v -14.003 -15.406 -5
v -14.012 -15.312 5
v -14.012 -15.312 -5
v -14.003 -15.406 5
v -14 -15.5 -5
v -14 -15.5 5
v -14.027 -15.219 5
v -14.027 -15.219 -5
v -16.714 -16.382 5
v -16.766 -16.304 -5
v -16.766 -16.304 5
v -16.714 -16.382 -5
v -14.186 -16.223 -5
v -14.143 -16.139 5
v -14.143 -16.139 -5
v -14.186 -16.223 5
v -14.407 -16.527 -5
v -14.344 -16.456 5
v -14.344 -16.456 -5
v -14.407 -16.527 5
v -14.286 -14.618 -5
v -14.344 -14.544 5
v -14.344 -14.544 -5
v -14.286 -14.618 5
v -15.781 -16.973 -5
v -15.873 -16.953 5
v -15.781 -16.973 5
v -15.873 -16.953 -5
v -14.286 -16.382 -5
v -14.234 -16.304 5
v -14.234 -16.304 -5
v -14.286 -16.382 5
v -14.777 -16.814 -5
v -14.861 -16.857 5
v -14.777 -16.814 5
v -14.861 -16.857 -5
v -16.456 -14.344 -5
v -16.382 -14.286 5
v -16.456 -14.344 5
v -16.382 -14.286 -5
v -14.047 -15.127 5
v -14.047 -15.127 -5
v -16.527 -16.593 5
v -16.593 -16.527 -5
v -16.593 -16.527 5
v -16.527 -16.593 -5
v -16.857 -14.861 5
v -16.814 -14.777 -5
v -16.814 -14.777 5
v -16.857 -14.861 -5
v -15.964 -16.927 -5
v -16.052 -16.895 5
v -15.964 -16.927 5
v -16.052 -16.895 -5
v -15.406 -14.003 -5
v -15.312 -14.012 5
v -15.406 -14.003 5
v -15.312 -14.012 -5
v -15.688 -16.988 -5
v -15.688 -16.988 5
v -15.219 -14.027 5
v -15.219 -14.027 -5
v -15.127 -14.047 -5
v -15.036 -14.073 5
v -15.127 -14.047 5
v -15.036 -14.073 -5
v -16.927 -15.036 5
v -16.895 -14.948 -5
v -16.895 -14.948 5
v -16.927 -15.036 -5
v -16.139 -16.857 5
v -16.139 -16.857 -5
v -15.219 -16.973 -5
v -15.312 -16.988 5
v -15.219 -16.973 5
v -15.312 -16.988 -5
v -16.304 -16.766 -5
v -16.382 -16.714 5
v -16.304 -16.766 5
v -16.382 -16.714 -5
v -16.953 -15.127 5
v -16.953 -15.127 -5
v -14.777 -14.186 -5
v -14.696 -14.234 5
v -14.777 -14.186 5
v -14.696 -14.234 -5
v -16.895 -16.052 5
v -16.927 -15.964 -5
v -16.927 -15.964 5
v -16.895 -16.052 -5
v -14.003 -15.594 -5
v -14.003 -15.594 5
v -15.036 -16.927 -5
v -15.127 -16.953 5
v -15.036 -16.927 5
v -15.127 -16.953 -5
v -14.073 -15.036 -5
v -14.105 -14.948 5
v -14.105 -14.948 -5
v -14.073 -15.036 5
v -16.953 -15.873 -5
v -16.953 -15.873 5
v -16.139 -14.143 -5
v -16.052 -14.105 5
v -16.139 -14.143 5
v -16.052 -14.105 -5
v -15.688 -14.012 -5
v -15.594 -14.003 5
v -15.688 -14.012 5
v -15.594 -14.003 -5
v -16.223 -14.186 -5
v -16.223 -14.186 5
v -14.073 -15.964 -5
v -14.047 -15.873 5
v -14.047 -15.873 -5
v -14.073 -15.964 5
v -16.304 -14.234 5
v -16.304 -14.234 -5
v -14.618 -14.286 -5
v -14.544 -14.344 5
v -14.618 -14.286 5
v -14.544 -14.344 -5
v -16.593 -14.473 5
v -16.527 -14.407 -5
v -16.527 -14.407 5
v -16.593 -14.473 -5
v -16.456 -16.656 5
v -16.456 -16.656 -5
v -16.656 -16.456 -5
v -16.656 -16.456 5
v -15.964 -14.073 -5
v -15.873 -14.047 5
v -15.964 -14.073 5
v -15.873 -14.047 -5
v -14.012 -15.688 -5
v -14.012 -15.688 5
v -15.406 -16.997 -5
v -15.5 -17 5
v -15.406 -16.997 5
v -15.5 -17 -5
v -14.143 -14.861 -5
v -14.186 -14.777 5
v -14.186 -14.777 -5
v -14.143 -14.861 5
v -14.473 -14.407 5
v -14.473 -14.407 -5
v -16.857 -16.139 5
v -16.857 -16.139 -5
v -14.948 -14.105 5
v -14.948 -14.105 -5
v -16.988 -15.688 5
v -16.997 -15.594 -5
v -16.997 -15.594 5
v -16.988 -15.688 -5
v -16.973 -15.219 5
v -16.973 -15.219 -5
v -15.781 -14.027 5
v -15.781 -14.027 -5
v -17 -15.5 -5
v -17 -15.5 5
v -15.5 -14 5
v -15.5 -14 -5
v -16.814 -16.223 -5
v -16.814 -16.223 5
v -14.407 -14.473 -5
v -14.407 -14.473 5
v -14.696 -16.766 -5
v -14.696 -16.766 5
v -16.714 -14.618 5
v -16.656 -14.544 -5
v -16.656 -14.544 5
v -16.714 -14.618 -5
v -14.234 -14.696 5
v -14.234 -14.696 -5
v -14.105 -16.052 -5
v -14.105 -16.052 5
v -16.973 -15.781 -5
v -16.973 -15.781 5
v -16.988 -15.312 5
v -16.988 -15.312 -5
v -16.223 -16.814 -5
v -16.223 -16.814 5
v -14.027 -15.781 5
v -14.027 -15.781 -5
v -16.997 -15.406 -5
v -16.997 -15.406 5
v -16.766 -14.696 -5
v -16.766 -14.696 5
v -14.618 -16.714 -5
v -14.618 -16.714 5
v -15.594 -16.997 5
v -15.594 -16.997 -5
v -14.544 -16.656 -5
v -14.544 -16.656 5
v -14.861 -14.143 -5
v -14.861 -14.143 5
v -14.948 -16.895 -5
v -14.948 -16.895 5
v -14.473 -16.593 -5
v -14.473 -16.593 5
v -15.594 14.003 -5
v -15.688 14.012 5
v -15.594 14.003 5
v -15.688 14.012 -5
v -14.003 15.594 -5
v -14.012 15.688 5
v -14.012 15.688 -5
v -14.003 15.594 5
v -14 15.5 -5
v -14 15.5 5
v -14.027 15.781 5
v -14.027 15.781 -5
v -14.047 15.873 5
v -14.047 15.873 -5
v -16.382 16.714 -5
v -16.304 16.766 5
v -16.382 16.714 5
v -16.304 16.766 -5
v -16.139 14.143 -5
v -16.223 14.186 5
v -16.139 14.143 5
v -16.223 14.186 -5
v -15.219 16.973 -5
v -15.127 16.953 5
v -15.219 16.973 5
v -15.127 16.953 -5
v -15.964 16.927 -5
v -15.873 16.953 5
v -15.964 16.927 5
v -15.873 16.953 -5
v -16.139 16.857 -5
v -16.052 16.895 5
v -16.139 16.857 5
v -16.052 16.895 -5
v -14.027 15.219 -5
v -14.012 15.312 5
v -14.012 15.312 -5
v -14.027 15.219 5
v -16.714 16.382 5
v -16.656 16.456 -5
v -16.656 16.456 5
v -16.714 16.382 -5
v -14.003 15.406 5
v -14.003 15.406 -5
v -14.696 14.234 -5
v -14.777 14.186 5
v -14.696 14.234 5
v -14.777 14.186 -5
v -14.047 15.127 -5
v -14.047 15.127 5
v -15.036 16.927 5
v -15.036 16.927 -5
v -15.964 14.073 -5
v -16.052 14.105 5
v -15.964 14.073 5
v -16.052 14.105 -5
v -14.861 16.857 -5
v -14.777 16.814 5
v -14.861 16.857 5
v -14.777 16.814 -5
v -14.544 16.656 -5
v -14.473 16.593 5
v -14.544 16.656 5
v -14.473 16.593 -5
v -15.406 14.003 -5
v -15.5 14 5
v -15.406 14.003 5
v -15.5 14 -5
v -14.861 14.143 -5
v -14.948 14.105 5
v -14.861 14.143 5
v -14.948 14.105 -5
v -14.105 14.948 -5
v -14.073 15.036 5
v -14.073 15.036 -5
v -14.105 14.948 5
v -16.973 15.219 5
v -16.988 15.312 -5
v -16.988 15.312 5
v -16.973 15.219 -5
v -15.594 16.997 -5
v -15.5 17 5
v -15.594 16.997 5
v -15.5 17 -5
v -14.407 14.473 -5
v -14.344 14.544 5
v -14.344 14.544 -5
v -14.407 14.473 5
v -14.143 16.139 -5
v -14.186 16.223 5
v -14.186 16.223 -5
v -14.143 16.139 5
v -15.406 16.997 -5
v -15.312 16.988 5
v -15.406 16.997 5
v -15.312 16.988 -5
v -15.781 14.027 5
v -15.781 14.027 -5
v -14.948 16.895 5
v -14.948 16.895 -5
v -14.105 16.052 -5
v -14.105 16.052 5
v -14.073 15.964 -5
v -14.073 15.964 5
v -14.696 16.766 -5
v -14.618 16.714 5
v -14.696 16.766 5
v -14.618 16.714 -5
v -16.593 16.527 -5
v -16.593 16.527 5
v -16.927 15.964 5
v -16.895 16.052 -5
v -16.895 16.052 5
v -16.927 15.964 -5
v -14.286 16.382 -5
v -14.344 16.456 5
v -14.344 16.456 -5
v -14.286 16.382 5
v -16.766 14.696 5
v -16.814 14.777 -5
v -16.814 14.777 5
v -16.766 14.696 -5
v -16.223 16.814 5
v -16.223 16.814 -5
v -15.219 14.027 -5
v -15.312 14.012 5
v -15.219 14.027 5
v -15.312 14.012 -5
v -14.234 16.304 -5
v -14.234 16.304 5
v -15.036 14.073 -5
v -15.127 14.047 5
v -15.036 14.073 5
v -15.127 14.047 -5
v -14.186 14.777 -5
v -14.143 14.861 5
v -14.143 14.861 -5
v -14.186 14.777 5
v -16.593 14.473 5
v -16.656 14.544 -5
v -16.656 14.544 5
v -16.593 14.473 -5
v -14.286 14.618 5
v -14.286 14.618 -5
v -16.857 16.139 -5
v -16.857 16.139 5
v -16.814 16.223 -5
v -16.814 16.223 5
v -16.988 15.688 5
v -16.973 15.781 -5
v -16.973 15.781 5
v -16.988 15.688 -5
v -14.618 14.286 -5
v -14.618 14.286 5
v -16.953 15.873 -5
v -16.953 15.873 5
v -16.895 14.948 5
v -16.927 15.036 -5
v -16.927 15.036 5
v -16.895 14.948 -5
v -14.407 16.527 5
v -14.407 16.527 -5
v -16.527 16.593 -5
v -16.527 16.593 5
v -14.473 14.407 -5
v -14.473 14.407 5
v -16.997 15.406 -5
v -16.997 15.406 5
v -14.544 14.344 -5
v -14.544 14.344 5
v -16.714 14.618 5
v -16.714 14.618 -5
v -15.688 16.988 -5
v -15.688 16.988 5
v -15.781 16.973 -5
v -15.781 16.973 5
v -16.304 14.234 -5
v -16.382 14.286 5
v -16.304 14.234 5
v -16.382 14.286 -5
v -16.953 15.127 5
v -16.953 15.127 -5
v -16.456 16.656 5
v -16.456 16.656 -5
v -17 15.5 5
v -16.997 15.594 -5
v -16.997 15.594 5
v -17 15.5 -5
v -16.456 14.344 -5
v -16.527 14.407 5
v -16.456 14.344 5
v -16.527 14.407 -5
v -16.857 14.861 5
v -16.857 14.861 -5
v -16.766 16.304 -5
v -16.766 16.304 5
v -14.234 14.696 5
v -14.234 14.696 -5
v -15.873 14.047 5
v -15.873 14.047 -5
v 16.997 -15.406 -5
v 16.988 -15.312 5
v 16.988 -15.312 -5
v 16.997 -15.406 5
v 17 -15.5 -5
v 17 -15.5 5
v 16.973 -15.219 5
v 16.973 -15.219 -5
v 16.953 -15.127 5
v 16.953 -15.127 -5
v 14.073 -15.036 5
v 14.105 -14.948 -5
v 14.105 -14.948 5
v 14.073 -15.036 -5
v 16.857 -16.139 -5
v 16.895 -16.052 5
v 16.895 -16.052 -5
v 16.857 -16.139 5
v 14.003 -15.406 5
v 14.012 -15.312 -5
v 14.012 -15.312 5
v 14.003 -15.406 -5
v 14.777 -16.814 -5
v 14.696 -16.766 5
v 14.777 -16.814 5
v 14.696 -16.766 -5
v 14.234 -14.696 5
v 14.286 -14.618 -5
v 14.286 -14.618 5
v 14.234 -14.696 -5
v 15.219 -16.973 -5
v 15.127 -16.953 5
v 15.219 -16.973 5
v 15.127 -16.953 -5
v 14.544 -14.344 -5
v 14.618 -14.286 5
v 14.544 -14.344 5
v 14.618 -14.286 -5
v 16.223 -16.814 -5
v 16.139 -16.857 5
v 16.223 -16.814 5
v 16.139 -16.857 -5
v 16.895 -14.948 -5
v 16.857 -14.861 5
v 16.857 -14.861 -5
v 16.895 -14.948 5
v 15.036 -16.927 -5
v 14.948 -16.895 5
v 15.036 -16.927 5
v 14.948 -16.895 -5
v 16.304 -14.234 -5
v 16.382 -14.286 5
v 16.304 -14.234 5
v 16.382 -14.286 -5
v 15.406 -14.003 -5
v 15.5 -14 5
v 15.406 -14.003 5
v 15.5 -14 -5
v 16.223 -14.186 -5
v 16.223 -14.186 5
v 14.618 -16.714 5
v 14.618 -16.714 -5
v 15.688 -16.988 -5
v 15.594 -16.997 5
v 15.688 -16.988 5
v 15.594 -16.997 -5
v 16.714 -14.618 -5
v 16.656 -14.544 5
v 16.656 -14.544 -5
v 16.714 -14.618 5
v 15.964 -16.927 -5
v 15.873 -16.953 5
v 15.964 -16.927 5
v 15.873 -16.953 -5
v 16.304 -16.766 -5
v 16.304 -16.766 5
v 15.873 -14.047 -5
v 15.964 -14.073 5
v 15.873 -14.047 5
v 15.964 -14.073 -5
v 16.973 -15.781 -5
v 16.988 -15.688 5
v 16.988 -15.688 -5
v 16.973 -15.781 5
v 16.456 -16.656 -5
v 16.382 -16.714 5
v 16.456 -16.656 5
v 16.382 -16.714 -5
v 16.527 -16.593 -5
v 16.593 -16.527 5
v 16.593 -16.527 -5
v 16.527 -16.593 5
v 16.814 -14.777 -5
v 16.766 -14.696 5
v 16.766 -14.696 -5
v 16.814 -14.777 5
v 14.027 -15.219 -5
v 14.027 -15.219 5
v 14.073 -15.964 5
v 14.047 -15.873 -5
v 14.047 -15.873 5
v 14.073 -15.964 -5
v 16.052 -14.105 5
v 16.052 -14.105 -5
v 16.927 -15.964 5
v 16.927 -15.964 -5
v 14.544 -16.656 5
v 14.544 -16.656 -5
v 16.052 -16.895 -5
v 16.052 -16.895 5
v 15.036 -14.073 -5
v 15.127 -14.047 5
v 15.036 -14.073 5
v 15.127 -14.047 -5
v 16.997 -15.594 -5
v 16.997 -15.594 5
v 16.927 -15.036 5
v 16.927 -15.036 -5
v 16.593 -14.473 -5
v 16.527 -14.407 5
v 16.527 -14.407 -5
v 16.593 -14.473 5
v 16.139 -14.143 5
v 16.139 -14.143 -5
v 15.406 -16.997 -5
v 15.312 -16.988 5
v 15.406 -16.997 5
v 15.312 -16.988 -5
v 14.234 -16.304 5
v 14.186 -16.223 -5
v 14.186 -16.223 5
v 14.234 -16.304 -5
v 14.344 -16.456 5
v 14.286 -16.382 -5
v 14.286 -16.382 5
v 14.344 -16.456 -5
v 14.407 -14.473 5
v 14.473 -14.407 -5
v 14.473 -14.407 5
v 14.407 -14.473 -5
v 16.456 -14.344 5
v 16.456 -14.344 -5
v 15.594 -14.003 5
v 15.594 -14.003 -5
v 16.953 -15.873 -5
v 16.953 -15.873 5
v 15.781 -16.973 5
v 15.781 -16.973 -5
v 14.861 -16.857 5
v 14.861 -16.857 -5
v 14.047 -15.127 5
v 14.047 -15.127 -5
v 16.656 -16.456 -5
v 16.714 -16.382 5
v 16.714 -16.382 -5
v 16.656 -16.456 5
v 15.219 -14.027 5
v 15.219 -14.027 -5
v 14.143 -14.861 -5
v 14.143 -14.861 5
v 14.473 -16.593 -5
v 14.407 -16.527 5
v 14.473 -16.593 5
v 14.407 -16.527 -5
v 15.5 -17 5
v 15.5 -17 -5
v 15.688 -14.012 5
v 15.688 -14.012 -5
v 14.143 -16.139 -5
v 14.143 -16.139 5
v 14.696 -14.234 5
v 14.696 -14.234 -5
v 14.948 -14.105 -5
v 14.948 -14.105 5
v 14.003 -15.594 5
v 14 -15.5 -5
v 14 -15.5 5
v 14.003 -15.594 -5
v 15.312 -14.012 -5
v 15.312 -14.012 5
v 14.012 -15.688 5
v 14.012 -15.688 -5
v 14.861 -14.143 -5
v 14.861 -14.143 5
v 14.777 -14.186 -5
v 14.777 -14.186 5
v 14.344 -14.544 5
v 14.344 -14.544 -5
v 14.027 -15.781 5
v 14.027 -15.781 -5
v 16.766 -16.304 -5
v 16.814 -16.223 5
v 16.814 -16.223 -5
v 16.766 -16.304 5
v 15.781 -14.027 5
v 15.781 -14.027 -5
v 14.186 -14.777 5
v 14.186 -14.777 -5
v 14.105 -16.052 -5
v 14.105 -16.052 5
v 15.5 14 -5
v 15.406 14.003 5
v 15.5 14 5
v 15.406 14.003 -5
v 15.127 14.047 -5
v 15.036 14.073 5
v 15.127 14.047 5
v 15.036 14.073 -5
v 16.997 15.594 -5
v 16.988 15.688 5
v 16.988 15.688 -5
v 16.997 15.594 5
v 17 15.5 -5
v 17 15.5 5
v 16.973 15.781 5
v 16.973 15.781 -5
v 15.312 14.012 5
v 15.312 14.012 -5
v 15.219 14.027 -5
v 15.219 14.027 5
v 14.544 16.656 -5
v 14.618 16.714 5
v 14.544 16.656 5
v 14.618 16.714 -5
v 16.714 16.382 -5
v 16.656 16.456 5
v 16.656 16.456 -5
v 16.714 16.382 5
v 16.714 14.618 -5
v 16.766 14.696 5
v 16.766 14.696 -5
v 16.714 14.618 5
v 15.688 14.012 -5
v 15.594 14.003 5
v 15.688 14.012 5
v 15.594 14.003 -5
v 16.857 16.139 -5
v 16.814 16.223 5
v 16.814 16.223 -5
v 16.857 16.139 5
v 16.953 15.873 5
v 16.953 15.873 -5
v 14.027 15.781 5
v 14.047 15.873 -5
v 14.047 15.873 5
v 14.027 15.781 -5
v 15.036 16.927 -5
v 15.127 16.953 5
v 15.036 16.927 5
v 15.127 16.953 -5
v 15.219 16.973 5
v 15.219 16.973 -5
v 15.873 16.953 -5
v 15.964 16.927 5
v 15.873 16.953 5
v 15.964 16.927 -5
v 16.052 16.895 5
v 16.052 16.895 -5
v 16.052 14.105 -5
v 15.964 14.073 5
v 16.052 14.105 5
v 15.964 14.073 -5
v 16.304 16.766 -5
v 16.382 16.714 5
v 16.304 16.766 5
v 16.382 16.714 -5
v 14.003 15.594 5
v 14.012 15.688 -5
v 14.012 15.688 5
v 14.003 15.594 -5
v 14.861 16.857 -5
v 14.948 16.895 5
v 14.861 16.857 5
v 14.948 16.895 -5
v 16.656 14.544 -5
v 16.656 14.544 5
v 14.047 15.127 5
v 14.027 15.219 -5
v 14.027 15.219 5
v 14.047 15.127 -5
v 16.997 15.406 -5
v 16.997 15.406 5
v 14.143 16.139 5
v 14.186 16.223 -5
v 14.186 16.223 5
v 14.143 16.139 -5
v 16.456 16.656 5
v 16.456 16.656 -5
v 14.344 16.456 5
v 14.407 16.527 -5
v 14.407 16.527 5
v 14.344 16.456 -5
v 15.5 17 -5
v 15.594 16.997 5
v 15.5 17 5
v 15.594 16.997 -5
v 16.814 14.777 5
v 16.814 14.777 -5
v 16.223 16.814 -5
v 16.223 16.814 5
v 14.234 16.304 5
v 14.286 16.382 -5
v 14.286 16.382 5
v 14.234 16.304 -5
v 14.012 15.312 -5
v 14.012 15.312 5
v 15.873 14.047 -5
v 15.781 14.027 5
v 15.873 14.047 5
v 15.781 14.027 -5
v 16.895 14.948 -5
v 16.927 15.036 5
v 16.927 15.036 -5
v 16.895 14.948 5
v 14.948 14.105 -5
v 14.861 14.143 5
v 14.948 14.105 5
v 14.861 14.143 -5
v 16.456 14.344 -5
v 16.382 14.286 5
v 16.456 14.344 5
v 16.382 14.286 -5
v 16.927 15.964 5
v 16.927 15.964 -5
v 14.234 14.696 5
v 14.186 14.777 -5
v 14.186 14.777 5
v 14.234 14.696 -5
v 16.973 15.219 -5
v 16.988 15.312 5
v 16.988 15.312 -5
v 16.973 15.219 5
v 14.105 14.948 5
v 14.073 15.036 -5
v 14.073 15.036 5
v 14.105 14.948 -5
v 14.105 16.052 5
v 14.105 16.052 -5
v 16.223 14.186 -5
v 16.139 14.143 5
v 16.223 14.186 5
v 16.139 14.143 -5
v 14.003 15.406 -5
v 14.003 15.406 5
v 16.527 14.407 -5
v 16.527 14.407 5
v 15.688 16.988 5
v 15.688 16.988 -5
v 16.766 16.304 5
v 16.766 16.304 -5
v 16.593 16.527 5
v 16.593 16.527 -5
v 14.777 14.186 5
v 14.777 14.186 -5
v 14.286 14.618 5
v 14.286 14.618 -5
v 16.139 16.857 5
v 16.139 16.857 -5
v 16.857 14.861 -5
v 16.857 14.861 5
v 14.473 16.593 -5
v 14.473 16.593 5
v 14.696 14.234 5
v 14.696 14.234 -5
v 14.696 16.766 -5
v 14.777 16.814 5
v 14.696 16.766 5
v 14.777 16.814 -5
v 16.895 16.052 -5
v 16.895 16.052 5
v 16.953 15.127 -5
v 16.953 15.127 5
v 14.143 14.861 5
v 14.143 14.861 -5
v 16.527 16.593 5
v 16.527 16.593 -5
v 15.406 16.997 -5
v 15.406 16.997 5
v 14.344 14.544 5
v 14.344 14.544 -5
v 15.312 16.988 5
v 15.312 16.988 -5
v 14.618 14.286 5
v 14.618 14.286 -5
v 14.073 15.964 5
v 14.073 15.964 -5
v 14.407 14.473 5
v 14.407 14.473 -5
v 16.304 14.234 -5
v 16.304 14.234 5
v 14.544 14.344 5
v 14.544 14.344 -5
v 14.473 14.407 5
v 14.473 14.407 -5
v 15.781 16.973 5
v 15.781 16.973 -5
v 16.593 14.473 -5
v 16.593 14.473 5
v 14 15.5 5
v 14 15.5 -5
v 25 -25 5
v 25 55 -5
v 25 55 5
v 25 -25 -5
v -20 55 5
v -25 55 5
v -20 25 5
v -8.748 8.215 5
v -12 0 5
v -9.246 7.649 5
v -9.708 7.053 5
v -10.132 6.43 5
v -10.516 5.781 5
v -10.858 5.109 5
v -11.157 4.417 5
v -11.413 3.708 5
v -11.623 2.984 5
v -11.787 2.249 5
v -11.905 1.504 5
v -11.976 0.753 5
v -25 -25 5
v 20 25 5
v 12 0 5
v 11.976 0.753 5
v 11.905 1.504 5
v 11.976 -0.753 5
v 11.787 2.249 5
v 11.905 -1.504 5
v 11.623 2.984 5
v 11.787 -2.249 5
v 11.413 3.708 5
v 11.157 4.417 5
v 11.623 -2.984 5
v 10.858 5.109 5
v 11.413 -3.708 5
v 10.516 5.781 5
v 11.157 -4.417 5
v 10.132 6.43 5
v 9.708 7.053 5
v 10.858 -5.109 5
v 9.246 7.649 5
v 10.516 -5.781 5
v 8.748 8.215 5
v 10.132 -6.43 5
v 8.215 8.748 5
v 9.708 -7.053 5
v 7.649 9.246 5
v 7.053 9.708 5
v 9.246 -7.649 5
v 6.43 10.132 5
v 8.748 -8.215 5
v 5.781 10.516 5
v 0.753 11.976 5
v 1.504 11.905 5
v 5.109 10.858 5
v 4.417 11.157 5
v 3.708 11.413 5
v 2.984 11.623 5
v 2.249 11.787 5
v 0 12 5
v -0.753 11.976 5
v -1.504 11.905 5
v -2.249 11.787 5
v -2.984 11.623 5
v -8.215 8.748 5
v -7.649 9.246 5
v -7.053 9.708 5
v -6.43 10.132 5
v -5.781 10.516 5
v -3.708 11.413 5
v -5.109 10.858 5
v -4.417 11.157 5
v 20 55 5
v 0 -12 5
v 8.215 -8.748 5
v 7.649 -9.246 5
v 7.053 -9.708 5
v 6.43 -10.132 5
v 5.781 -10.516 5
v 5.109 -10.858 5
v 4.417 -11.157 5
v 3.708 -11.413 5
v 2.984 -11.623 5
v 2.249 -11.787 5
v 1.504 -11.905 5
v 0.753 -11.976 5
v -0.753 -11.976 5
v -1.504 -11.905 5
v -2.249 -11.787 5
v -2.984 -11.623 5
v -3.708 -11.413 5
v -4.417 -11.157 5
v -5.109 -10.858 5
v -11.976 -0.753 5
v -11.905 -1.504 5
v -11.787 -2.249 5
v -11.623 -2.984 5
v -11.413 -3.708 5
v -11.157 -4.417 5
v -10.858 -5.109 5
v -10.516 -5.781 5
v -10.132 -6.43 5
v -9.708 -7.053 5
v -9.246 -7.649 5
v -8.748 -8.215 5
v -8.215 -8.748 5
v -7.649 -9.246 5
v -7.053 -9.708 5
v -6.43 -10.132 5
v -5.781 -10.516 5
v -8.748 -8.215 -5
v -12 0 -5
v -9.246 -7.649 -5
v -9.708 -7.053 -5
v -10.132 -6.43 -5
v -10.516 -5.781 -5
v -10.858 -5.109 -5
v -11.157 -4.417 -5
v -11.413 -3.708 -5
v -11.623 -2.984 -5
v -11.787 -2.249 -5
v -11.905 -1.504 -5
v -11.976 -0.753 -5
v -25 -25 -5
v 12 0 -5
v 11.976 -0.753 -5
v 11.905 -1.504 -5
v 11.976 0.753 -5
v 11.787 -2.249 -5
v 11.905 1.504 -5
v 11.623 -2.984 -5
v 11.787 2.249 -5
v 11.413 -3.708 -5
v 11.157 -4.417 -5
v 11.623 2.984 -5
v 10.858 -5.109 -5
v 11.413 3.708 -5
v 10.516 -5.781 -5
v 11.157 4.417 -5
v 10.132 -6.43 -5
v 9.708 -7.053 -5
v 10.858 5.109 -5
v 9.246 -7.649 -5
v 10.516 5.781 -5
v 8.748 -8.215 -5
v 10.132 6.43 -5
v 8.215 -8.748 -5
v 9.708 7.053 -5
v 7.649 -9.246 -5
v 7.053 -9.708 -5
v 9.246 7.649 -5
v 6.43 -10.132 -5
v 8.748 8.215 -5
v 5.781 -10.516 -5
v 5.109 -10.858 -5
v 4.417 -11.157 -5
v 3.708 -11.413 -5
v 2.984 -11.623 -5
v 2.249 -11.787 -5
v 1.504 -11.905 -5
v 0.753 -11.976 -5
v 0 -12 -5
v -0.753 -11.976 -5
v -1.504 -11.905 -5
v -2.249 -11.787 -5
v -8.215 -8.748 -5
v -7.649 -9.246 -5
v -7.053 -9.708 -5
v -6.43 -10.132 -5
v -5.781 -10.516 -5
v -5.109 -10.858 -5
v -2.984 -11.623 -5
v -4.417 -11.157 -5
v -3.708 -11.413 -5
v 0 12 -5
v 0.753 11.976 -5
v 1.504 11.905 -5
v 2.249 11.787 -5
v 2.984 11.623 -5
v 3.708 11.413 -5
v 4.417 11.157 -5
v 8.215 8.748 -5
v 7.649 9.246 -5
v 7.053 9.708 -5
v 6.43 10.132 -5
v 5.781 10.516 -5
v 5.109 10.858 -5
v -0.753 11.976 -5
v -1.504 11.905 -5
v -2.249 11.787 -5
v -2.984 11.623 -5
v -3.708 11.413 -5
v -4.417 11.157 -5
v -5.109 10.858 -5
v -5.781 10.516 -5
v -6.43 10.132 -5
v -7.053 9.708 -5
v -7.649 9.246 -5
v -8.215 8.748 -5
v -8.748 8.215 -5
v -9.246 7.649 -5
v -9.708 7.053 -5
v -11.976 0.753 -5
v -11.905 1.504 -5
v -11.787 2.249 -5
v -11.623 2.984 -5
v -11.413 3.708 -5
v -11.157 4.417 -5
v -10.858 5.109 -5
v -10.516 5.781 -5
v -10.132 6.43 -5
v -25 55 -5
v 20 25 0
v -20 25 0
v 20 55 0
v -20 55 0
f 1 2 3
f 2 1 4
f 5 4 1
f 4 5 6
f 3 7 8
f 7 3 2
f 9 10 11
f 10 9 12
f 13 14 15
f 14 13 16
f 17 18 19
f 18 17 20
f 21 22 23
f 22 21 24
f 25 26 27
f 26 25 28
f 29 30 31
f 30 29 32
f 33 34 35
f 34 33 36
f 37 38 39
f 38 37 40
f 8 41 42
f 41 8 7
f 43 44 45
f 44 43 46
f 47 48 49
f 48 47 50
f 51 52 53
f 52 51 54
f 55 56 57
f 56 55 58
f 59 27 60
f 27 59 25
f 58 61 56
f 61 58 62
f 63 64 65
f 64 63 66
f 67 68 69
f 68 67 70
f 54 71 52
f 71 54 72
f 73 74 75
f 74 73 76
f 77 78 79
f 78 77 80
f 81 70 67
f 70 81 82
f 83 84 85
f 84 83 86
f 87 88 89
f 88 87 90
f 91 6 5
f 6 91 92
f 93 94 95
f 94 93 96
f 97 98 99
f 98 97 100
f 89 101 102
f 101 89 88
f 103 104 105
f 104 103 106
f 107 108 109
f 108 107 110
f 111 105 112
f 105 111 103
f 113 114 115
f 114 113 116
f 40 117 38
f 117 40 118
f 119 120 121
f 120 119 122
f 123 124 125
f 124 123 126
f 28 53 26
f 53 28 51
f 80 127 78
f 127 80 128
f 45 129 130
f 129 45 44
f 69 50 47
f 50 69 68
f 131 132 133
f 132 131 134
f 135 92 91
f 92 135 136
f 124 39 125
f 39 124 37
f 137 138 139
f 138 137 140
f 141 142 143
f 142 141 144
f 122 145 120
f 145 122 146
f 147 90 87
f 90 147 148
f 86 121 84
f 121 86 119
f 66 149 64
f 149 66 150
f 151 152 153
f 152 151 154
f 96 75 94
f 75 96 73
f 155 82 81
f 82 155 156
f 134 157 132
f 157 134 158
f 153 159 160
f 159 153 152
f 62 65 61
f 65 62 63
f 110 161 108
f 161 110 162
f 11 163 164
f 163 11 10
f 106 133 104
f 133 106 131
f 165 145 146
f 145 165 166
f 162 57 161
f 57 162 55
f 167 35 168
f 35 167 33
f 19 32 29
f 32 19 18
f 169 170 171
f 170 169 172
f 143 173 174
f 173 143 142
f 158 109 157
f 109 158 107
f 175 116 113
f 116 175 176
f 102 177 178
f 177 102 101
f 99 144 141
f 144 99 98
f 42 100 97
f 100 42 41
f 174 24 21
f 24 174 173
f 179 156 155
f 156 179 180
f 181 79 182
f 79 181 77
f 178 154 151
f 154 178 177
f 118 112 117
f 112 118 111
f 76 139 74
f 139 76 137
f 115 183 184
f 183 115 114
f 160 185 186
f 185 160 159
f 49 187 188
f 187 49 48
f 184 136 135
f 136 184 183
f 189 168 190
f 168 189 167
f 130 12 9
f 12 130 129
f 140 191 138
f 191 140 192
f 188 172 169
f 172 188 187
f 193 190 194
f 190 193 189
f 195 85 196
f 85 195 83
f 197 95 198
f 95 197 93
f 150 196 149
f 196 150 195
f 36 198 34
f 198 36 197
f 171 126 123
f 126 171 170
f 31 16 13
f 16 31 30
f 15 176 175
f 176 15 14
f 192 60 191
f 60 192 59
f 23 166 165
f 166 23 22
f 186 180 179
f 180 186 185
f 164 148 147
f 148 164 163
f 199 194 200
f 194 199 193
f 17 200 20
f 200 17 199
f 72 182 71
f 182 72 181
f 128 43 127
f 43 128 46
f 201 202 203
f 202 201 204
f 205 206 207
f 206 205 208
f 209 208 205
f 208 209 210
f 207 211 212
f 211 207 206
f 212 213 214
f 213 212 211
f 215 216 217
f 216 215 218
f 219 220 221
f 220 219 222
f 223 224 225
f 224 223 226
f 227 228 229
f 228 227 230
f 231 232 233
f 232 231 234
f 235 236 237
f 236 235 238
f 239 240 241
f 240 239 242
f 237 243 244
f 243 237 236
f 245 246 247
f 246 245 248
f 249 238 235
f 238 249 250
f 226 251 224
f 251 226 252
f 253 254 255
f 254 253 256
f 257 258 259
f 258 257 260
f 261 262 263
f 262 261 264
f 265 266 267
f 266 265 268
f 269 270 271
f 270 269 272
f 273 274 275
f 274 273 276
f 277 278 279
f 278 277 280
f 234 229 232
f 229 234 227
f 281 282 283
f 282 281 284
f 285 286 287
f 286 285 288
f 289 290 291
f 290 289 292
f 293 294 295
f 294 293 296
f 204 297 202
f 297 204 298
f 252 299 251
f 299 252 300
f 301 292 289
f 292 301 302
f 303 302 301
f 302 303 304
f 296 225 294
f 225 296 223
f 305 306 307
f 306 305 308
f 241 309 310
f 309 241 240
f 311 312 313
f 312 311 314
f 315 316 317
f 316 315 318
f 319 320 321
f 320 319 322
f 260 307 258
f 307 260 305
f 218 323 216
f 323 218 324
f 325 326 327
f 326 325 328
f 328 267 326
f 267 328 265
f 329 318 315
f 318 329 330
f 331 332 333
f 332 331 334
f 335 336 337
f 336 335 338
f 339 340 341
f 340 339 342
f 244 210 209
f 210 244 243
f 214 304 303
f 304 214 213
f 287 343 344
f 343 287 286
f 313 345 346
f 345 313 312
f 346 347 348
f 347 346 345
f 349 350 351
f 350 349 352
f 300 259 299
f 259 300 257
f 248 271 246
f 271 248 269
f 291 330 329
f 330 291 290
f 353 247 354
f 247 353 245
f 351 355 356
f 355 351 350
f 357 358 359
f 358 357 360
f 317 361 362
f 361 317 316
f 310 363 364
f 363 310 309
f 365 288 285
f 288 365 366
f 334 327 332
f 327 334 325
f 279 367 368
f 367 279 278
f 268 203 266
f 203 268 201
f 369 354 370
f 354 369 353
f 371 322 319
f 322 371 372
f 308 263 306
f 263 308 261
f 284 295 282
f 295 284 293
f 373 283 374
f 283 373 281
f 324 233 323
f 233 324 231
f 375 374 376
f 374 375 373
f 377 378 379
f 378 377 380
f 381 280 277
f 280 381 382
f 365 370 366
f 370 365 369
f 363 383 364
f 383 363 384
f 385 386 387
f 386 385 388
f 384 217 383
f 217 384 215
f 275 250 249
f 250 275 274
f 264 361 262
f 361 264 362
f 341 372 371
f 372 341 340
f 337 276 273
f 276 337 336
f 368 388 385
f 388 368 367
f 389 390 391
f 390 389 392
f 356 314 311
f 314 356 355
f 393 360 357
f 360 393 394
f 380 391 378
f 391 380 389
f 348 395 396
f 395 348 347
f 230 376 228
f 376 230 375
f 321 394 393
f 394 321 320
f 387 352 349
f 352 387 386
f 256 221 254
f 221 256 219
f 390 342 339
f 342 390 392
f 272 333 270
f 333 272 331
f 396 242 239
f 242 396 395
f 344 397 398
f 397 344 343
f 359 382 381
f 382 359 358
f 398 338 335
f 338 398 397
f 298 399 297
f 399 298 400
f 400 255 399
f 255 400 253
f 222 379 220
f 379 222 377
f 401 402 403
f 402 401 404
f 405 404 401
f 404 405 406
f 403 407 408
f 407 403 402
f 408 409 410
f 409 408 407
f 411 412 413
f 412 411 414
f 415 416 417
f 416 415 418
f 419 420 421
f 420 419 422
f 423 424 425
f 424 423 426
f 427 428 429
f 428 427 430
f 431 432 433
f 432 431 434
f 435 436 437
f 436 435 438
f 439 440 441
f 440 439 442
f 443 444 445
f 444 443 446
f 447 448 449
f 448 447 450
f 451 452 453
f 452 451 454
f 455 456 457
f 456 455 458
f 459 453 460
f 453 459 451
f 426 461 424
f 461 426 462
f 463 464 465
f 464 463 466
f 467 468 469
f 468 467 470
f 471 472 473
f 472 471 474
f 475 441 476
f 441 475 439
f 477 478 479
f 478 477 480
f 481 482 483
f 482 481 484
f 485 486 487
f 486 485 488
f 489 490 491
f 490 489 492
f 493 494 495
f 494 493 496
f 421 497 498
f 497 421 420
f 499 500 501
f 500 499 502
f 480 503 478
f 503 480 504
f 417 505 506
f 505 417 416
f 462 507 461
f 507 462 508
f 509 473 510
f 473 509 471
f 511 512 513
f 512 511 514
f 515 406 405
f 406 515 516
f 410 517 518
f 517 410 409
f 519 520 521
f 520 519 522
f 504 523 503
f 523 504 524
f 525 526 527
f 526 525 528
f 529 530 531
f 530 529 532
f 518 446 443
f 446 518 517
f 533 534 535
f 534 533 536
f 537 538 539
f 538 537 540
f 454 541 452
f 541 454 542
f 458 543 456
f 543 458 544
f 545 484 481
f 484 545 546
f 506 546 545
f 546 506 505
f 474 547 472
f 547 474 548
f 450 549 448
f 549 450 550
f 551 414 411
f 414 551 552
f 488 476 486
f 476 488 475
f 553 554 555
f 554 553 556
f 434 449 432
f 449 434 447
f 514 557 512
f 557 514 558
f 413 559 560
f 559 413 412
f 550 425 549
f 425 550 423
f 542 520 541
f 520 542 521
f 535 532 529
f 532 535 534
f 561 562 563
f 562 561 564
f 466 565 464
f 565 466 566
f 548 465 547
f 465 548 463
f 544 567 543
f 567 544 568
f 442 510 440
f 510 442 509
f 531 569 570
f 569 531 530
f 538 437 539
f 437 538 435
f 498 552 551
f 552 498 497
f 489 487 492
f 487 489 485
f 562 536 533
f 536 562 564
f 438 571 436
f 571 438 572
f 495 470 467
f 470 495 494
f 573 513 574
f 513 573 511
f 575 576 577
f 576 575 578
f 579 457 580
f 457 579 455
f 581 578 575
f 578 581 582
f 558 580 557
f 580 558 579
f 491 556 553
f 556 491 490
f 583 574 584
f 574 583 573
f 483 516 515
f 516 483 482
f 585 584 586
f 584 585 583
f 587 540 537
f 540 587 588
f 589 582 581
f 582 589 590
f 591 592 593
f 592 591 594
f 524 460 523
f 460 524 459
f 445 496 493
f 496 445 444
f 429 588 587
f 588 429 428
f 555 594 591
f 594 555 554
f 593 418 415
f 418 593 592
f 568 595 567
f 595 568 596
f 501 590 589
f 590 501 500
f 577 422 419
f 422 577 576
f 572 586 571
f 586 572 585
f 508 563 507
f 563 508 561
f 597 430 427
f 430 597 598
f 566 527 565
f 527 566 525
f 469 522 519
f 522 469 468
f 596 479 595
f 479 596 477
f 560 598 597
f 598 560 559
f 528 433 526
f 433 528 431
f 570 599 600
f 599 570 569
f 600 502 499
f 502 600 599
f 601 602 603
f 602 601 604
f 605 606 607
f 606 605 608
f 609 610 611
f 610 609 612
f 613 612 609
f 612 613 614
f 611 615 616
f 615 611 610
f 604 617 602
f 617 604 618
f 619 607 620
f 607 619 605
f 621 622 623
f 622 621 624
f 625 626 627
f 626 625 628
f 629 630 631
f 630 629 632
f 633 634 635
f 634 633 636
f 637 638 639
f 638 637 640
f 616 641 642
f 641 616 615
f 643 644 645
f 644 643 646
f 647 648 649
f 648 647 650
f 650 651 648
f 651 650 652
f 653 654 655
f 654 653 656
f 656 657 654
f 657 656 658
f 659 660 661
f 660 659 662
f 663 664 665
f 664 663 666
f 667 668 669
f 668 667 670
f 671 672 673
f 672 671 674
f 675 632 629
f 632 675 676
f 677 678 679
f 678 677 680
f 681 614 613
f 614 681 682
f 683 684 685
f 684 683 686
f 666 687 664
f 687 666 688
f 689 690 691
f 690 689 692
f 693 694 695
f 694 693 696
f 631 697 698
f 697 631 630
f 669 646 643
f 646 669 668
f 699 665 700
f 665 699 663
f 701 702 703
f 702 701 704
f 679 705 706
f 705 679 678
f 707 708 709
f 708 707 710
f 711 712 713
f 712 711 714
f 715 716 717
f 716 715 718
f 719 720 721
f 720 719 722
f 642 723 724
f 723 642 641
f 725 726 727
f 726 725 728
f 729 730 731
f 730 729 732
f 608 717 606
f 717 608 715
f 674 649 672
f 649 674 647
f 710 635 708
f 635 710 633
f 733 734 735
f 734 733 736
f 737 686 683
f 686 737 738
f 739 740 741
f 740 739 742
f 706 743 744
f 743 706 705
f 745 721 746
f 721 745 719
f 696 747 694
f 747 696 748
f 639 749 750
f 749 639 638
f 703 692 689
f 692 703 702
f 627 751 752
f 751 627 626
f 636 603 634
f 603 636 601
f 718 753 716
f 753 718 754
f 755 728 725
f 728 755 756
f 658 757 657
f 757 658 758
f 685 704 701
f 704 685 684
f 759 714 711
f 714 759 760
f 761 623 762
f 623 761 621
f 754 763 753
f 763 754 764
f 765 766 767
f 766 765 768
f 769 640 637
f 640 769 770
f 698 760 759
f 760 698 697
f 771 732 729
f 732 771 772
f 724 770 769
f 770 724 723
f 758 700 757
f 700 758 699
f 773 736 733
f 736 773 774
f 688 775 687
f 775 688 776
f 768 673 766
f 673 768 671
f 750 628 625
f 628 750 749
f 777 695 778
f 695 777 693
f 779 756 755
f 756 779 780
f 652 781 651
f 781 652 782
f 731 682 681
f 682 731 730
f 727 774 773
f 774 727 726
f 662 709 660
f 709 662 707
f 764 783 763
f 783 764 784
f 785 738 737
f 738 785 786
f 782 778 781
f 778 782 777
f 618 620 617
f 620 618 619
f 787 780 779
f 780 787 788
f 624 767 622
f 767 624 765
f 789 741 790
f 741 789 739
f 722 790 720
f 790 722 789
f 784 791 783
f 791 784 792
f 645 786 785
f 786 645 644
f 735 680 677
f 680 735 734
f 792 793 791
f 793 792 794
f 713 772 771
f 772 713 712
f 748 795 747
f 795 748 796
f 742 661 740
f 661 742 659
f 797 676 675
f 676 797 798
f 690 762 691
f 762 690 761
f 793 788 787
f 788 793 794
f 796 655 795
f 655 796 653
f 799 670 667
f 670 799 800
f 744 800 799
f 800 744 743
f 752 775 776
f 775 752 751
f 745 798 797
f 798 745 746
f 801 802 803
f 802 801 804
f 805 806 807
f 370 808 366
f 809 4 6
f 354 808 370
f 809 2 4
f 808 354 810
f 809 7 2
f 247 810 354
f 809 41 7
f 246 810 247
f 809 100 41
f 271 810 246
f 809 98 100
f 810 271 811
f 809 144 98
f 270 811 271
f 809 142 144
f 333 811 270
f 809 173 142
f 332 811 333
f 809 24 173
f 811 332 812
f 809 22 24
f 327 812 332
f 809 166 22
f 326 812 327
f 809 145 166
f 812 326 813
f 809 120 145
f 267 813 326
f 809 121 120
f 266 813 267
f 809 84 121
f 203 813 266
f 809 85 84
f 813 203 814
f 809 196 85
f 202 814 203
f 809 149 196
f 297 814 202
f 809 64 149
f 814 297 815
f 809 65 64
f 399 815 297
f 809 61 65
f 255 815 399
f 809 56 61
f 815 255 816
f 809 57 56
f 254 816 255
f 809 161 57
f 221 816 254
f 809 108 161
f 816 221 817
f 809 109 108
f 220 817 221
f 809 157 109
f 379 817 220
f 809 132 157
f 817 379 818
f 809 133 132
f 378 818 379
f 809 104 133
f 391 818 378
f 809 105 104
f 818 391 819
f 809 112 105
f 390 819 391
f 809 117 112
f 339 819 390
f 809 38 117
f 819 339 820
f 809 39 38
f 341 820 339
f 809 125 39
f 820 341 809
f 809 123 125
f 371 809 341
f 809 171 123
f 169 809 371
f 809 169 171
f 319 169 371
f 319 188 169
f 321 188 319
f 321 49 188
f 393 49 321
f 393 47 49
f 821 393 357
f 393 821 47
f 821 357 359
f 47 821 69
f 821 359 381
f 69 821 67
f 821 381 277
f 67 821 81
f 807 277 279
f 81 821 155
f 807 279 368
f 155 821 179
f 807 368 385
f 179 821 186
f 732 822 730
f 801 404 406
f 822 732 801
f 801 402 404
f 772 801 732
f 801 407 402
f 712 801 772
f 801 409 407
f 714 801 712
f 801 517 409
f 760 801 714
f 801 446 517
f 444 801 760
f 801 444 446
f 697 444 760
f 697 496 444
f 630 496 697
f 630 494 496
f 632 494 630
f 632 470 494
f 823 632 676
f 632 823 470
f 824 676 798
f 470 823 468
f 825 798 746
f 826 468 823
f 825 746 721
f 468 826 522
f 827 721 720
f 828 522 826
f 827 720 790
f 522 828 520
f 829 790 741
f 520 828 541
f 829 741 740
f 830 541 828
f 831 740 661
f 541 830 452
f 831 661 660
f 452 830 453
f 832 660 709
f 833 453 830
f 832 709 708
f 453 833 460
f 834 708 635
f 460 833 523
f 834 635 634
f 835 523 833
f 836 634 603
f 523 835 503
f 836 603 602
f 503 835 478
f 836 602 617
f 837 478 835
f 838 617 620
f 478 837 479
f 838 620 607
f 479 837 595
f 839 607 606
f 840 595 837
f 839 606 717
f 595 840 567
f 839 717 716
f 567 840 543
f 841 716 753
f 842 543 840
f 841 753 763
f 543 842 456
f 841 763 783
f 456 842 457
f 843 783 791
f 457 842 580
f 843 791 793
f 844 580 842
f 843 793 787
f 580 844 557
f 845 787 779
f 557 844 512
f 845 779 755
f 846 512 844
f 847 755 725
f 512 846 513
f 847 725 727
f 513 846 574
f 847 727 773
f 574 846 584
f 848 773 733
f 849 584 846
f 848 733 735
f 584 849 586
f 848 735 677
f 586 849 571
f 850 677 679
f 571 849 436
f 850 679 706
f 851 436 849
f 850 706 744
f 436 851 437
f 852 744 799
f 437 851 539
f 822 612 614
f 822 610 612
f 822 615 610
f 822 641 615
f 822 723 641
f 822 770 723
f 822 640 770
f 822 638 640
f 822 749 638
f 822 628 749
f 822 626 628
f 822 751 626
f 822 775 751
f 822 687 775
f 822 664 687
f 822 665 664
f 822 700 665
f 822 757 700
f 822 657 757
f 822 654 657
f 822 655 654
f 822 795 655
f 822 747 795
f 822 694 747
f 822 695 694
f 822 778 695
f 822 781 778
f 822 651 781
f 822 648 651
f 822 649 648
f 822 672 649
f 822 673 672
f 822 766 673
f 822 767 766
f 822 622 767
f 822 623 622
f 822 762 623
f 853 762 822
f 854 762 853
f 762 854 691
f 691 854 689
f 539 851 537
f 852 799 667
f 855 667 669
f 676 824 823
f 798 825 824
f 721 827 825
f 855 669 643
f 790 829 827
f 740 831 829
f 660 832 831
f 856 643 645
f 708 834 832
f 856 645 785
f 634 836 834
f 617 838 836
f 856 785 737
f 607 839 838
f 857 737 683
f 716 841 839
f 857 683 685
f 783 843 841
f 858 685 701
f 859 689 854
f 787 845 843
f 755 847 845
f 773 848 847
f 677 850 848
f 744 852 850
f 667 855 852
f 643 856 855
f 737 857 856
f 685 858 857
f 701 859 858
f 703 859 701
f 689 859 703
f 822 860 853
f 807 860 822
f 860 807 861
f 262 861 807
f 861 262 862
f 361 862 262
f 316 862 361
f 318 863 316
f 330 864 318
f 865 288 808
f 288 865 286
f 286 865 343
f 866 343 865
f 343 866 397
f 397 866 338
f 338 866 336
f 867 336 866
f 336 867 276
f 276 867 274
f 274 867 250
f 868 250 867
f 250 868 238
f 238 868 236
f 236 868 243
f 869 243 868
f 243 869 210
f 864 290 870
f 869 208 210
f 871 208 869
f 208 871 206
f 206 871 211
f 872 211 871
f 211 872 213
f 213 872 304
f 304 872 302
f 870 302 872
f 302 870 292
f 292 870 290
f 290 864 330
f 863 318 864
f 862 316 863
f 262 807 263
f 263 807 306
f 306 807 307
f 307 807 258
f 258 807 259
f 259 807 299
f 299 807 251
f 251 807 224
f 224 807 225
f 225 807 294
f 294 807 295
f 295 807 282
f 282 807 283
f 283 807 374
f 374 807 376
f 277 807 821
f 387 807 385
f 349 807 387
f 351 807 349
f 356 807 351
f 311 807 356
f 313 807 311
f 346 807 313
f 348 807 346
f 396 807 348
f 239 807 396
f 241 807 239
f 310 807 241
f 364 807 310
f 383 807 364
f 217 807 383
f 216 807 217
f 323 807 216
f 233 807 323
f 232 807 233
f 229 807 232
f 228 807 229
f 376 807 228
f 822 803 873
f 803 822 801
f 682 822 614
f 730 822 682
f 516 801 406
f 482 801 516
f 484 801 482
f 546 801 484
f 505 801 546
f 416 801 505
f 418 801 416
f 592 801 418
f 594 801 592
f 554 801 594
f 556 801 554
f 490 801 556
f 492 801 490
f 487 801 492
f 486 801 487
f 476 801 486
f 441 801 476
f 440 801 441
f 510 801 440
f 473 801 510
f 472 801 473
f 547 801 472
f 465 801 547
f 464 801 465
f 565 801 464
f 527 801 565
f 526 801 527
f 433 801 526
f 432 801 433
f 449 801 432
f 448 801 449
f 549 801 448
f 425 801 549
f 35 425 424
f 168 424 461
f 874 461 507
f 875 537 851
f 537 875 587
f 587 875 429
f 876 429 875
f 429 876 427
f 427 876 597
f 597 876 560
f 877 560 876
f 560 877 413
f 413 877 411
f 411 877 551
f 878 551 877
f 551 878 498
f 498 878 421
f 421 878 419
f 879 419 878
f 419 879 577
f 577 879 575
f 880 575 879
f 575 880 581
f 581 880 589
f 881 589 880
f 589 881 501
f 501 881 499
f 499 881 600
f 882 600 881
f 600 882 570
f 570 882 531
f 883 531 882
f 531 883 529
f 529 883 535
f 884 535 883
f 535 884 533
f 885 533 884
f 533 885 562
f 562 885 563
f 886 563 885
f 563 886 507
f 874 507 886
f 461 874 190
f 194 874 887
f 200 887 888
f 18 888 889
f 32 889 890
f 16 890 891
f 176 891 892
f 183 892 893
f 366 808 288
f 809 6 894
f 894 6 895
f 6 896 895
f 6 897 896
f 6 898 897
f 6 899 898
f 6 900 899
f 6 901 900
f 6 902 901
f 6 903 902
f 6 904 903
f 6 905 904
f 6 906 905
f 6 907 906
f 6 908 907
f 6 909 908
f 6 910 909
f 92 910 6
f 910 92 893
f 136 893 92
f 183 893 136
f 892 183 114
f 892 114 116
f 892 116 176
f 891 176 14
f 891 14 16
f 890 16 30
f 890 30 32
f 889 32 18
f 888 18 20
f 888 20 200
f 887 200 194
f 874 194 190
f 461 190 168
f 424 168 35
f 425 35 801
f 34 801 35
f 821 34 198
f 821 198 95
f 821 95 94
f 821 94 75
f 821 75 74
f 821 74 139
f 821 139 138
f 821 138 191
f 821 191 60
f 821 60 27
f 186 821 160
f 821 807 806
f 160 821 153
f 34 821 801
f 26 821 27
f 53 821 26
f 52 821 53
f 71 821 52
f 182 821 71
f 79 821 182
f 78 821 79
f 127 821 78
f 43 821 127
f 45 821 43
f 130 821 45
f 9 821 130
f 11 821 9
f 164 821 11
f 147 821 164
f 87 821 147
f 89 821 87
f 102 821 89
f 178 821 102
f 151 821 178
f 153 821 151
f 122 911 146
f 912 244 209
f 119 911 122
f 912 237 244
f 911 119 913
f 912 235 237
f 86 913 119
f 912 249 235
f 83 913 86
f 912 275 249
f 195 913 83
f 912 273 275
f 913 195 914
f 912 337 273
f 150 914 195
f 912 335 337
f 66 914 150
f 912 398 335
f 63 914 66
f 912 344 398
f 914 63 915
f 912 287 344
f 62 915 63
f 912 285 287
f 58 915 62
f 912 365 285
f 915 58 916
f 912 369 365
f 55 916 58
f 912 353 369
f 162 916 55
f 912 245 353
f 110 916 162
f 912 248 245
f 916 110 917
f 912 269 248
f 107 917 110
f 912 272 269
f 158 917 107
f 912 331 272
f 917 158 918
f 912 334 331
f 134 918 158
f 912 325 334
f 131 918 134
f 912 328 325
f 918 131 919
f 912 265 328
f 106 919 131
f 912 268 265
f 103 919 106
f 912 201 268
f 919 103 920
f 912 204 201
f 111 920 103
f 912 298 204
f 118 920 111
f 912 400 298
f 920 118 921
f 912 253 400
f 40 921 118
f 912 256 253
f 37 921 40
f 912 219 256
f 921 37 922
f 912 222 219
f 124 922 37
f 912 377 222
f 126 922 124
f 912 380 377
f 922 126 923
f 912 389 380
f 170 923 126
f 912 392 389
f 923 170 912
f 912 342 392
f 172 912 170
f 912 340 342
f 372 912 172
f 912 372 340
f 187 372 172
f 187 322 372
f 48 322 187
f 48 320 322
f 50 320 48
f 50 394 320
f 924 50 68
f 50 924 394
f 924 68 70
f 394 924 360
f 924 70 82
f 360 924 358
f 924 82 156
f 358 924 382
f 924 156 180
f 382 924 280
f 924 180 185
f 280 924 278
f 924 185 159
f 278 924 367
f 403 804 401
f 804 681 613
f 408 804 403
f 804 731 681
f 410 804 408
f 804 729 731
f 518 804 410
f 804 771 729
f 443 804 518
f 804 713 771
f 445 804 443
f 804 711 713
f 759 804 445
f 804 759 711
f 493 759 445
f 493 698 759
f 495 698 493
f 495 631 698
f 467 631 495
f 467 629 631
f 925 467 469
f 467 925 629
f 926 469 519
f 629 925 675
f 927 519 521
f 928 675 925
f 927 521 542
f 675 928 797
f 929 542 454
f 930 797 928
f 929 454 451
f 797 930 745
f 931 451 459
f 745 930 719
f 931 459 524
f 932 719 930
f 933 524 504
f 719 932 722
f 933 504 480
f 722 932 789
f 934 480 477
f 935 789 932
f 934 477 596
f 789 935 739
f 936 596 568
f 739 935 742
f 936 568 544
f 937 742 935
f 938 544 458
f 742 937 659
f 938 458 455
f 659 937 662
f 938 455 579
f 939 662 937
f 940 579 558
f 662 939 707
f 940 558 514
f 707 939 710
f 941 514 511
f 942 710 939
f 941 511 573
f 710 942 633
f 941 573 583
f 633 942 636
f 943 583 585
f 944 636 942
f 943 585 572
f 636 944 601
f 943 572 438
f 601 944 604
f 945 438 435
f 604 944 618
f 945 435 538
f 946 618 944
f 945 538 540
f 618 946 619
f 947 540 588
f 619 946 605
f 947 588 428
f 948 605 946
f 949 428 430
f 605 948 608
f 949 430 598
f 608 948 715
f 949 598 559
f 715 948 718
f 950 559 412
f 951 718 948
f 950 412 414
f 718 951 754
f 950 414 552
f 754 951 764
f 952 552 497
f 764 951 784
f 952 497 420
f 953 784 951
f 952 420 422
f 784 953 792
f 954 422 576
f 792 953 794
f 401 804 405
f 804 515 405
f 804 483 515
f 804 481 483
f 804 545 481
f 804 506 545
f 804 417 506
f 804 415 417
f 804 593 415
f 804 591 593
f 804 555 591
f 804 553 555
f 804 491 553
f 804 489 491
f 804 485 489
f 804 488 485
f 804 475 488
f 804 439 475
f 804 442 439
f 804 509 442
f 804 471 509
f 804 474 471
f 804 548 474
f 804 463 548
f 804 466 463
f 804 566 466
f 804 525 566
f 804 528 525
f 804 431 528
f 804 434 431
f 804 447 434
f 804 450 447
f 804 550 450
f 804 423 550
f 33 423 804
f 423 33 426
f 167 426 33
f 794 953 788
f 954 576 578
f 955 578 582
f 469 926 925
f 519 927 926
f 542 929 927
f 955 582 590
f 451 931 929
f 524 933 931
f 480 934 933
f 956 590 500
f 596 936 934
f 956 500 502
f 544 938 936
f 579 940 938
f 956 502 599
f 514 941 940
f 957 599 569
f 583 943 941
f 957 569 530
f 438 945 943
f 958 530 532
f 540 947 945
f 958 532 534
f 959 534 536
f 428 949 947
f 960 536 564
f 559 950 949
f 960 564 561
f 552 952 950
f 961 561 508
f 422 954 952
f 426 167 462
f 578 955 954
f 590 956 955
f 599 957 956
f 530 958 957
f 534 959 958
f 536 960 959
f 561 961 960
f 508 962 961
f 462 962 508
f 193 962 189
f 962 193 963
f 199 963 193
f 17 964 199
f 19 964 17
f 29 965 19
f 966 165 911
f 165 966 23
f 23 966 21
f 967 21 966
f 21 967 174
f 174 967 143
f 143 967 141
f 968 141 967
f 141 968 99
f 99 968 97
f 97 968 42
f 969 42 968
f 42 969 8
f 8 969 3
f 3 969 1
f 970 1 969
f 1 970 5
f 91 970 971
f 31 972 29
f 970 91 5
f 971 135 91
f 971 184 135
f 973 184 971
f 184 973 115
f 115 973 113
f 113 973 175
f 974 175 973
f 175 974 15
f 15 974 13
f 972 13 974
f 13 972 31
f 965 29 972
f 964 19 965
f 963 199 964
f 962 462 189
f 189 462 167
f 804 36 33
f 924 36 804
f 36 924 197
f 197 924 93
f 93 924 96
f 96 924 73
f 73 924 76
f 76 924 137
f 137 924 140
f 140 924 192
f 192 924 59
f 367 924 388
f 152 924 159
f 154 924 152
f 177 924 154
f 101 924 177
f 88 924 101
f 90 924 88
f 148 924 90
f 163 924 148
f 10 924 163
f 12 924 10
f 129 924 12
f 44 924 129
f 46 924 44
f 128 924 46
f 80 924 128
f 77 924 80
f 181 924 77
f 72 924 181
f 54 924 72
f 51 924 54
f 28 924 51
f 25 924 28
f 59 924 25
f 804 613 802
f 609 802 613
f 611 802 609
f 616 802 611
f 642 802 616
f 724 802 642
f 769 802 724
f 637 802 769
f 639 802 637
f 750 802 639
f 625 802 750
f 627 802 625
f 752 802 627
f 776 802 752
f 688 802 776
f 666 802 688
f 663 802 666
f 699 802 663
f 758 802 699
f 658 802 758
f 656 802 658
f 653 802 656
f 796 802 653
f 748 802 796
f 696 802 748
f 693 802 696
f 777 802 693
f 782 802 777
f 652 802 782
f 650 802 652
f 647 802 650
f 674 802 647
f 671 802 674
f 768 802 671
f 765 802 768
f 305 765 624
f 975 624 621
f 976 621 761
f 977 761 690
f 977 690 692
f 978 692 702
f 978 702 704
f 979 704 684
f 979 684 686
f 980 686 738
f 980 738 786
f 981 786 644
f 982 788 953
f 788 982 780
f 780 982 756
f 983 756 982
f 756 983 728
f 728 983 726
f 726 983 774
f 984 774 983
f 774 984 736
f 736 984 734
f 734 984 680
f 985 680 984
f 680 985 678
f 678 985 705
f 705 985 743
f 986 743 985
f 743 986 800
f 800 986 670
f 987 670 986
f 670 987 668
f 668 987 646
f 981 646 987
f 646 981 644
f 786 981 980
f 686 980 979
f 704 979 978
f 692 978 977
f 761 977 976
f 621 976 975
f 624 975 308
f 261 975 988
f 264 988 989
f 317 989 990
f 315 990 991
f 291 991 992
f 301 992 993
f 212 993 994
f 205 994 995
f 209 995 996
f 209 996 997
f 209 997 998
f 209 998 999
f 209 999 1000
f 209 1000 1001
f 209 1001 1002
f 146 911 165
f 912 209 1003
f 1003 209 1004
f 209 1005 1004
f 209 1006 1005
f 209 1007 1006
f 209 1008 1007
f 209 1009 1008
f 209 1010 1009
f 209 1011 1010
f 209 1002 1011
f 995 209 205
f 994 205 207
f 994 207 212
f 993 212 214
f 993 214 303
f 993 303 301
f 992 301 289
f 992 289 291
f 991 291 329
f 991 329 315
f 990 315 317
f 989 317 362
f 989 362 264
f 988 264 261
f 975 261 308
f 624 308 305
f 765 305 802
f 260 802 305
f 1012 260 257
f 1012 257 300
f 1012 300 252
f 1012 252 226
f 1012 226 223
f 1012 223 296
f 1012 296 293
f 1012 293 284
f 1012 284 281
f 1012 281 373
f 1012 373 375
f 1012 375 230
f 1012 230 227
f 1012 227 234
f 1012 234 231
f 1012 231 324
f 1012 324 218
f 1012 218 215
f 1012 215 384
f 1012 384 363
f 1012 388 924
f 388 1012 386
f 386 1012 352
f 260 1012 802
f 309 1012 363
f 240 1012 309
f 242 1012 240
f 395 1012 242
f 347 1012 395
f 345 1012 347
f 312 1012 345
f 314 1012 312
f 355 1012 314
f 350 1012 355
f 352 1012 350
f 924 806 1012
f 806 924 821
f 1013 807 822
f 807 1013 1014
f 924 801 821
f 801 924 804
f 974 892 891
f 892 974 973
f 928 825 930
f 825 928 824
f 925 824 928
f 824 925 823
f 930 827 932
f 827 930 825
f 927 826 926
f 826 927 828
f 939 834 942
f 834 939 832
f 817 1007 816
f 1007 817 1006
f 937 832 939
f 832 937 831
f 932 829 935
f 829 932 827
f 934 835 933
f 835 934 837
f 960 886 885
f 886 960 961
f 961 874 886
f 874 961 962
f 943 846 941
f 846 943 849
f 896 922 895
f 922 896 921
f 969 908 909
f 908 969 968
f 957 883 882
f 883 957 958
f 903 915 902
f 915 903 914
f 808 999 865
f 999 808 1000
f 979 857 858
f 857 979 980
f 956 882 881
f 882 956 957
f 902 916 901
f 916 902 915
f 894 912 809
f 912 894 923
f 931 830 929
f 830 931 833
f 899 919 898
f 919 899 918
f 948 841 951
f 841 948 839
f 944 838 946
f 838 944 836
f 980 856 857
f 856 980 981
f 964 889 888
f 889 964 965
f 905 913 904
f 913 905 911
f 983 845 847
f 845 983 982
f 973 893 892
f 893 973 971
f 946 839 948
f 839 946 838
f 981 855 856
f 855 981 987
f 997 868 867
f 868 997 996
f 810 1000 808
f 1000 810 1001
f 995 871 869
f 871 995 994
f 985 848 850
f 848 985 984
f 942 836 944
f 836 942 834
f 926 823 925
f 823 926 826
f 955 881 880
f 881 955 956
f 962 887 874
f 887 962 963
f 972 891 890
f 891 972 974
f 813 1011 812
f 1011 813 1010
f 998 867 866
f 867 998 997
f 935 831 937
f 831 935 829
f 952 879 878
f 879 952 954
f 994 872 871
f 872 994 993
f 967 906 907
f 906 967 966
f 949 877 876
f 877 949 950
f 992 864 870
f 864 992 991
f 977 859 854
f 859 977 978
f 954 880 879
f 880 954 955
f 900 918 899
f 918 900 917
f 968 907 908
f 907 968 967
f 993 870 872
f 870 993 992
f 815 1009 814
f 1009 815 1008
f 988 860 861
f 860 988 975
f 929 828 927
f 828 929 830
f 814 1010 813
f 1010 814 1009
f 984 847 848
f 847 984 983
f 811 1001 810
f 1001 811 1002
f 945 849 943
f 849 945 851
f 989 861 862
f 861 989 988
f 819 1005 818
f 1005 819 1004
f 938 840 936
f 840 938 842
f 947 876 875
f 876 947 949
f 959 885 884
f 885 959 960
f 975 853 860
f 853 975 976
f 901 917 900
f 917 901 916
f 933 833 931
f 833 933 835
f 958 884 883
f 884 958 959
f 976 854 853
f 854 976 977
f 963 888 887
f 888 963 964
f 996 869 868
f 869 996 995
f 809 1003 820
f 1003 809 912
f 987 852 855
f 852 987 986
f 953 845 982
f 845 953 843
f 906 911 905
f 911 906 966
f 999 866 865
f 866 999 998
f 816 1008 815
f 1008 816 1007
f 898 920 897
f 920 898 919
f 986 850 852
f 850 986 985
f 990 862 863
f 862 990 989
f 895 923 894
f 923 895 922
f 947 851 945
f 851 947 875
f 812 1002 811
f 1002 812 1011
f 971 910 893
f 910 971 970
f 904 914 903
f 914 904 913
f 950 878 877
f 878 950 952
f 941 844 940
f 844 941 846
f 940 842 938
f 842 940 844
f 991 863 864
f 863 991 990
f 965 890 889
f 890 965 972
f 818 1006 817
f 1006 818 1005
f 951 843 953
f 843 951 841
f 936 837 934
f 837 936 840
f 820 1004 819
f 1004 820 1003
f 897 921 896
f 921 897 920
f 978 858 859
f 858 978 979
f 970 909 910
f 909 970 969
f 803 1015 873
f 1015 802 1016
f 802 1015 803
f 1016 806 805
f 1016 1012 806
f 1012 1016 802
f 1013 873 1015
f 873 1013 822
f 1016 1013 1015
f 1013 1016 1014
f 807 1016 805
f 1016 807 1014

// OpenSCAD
$fn = 100; 

// spacers 
// http://www.mcmaster.com/#unthreaded-spacers/=yi08rr

// nema 17 motor mount and home switch mount

difference() {
  cube( [50,50,10], center=true ); 
  cylinder( r=12, h=20, center=true );
  // translate( [20,0,2] ) cube( [10,17,10 ], center=true );  
  for (i=[-1,1]) {
     for (j=[-1,1]) {
        translate( [15.5*i, 15.5*j, 0 ] ) cylinder( r=1.5, h=20, center=true ); // motor mounting holes
    }   
  }
}

translate( [0,40,0] ) difference( ) {
translate( [0,0,-0] ) cube( [50,30,10], center=true ); 
translate( [0,0,10] ) cube( [40,100,20], center=true ); 
}
